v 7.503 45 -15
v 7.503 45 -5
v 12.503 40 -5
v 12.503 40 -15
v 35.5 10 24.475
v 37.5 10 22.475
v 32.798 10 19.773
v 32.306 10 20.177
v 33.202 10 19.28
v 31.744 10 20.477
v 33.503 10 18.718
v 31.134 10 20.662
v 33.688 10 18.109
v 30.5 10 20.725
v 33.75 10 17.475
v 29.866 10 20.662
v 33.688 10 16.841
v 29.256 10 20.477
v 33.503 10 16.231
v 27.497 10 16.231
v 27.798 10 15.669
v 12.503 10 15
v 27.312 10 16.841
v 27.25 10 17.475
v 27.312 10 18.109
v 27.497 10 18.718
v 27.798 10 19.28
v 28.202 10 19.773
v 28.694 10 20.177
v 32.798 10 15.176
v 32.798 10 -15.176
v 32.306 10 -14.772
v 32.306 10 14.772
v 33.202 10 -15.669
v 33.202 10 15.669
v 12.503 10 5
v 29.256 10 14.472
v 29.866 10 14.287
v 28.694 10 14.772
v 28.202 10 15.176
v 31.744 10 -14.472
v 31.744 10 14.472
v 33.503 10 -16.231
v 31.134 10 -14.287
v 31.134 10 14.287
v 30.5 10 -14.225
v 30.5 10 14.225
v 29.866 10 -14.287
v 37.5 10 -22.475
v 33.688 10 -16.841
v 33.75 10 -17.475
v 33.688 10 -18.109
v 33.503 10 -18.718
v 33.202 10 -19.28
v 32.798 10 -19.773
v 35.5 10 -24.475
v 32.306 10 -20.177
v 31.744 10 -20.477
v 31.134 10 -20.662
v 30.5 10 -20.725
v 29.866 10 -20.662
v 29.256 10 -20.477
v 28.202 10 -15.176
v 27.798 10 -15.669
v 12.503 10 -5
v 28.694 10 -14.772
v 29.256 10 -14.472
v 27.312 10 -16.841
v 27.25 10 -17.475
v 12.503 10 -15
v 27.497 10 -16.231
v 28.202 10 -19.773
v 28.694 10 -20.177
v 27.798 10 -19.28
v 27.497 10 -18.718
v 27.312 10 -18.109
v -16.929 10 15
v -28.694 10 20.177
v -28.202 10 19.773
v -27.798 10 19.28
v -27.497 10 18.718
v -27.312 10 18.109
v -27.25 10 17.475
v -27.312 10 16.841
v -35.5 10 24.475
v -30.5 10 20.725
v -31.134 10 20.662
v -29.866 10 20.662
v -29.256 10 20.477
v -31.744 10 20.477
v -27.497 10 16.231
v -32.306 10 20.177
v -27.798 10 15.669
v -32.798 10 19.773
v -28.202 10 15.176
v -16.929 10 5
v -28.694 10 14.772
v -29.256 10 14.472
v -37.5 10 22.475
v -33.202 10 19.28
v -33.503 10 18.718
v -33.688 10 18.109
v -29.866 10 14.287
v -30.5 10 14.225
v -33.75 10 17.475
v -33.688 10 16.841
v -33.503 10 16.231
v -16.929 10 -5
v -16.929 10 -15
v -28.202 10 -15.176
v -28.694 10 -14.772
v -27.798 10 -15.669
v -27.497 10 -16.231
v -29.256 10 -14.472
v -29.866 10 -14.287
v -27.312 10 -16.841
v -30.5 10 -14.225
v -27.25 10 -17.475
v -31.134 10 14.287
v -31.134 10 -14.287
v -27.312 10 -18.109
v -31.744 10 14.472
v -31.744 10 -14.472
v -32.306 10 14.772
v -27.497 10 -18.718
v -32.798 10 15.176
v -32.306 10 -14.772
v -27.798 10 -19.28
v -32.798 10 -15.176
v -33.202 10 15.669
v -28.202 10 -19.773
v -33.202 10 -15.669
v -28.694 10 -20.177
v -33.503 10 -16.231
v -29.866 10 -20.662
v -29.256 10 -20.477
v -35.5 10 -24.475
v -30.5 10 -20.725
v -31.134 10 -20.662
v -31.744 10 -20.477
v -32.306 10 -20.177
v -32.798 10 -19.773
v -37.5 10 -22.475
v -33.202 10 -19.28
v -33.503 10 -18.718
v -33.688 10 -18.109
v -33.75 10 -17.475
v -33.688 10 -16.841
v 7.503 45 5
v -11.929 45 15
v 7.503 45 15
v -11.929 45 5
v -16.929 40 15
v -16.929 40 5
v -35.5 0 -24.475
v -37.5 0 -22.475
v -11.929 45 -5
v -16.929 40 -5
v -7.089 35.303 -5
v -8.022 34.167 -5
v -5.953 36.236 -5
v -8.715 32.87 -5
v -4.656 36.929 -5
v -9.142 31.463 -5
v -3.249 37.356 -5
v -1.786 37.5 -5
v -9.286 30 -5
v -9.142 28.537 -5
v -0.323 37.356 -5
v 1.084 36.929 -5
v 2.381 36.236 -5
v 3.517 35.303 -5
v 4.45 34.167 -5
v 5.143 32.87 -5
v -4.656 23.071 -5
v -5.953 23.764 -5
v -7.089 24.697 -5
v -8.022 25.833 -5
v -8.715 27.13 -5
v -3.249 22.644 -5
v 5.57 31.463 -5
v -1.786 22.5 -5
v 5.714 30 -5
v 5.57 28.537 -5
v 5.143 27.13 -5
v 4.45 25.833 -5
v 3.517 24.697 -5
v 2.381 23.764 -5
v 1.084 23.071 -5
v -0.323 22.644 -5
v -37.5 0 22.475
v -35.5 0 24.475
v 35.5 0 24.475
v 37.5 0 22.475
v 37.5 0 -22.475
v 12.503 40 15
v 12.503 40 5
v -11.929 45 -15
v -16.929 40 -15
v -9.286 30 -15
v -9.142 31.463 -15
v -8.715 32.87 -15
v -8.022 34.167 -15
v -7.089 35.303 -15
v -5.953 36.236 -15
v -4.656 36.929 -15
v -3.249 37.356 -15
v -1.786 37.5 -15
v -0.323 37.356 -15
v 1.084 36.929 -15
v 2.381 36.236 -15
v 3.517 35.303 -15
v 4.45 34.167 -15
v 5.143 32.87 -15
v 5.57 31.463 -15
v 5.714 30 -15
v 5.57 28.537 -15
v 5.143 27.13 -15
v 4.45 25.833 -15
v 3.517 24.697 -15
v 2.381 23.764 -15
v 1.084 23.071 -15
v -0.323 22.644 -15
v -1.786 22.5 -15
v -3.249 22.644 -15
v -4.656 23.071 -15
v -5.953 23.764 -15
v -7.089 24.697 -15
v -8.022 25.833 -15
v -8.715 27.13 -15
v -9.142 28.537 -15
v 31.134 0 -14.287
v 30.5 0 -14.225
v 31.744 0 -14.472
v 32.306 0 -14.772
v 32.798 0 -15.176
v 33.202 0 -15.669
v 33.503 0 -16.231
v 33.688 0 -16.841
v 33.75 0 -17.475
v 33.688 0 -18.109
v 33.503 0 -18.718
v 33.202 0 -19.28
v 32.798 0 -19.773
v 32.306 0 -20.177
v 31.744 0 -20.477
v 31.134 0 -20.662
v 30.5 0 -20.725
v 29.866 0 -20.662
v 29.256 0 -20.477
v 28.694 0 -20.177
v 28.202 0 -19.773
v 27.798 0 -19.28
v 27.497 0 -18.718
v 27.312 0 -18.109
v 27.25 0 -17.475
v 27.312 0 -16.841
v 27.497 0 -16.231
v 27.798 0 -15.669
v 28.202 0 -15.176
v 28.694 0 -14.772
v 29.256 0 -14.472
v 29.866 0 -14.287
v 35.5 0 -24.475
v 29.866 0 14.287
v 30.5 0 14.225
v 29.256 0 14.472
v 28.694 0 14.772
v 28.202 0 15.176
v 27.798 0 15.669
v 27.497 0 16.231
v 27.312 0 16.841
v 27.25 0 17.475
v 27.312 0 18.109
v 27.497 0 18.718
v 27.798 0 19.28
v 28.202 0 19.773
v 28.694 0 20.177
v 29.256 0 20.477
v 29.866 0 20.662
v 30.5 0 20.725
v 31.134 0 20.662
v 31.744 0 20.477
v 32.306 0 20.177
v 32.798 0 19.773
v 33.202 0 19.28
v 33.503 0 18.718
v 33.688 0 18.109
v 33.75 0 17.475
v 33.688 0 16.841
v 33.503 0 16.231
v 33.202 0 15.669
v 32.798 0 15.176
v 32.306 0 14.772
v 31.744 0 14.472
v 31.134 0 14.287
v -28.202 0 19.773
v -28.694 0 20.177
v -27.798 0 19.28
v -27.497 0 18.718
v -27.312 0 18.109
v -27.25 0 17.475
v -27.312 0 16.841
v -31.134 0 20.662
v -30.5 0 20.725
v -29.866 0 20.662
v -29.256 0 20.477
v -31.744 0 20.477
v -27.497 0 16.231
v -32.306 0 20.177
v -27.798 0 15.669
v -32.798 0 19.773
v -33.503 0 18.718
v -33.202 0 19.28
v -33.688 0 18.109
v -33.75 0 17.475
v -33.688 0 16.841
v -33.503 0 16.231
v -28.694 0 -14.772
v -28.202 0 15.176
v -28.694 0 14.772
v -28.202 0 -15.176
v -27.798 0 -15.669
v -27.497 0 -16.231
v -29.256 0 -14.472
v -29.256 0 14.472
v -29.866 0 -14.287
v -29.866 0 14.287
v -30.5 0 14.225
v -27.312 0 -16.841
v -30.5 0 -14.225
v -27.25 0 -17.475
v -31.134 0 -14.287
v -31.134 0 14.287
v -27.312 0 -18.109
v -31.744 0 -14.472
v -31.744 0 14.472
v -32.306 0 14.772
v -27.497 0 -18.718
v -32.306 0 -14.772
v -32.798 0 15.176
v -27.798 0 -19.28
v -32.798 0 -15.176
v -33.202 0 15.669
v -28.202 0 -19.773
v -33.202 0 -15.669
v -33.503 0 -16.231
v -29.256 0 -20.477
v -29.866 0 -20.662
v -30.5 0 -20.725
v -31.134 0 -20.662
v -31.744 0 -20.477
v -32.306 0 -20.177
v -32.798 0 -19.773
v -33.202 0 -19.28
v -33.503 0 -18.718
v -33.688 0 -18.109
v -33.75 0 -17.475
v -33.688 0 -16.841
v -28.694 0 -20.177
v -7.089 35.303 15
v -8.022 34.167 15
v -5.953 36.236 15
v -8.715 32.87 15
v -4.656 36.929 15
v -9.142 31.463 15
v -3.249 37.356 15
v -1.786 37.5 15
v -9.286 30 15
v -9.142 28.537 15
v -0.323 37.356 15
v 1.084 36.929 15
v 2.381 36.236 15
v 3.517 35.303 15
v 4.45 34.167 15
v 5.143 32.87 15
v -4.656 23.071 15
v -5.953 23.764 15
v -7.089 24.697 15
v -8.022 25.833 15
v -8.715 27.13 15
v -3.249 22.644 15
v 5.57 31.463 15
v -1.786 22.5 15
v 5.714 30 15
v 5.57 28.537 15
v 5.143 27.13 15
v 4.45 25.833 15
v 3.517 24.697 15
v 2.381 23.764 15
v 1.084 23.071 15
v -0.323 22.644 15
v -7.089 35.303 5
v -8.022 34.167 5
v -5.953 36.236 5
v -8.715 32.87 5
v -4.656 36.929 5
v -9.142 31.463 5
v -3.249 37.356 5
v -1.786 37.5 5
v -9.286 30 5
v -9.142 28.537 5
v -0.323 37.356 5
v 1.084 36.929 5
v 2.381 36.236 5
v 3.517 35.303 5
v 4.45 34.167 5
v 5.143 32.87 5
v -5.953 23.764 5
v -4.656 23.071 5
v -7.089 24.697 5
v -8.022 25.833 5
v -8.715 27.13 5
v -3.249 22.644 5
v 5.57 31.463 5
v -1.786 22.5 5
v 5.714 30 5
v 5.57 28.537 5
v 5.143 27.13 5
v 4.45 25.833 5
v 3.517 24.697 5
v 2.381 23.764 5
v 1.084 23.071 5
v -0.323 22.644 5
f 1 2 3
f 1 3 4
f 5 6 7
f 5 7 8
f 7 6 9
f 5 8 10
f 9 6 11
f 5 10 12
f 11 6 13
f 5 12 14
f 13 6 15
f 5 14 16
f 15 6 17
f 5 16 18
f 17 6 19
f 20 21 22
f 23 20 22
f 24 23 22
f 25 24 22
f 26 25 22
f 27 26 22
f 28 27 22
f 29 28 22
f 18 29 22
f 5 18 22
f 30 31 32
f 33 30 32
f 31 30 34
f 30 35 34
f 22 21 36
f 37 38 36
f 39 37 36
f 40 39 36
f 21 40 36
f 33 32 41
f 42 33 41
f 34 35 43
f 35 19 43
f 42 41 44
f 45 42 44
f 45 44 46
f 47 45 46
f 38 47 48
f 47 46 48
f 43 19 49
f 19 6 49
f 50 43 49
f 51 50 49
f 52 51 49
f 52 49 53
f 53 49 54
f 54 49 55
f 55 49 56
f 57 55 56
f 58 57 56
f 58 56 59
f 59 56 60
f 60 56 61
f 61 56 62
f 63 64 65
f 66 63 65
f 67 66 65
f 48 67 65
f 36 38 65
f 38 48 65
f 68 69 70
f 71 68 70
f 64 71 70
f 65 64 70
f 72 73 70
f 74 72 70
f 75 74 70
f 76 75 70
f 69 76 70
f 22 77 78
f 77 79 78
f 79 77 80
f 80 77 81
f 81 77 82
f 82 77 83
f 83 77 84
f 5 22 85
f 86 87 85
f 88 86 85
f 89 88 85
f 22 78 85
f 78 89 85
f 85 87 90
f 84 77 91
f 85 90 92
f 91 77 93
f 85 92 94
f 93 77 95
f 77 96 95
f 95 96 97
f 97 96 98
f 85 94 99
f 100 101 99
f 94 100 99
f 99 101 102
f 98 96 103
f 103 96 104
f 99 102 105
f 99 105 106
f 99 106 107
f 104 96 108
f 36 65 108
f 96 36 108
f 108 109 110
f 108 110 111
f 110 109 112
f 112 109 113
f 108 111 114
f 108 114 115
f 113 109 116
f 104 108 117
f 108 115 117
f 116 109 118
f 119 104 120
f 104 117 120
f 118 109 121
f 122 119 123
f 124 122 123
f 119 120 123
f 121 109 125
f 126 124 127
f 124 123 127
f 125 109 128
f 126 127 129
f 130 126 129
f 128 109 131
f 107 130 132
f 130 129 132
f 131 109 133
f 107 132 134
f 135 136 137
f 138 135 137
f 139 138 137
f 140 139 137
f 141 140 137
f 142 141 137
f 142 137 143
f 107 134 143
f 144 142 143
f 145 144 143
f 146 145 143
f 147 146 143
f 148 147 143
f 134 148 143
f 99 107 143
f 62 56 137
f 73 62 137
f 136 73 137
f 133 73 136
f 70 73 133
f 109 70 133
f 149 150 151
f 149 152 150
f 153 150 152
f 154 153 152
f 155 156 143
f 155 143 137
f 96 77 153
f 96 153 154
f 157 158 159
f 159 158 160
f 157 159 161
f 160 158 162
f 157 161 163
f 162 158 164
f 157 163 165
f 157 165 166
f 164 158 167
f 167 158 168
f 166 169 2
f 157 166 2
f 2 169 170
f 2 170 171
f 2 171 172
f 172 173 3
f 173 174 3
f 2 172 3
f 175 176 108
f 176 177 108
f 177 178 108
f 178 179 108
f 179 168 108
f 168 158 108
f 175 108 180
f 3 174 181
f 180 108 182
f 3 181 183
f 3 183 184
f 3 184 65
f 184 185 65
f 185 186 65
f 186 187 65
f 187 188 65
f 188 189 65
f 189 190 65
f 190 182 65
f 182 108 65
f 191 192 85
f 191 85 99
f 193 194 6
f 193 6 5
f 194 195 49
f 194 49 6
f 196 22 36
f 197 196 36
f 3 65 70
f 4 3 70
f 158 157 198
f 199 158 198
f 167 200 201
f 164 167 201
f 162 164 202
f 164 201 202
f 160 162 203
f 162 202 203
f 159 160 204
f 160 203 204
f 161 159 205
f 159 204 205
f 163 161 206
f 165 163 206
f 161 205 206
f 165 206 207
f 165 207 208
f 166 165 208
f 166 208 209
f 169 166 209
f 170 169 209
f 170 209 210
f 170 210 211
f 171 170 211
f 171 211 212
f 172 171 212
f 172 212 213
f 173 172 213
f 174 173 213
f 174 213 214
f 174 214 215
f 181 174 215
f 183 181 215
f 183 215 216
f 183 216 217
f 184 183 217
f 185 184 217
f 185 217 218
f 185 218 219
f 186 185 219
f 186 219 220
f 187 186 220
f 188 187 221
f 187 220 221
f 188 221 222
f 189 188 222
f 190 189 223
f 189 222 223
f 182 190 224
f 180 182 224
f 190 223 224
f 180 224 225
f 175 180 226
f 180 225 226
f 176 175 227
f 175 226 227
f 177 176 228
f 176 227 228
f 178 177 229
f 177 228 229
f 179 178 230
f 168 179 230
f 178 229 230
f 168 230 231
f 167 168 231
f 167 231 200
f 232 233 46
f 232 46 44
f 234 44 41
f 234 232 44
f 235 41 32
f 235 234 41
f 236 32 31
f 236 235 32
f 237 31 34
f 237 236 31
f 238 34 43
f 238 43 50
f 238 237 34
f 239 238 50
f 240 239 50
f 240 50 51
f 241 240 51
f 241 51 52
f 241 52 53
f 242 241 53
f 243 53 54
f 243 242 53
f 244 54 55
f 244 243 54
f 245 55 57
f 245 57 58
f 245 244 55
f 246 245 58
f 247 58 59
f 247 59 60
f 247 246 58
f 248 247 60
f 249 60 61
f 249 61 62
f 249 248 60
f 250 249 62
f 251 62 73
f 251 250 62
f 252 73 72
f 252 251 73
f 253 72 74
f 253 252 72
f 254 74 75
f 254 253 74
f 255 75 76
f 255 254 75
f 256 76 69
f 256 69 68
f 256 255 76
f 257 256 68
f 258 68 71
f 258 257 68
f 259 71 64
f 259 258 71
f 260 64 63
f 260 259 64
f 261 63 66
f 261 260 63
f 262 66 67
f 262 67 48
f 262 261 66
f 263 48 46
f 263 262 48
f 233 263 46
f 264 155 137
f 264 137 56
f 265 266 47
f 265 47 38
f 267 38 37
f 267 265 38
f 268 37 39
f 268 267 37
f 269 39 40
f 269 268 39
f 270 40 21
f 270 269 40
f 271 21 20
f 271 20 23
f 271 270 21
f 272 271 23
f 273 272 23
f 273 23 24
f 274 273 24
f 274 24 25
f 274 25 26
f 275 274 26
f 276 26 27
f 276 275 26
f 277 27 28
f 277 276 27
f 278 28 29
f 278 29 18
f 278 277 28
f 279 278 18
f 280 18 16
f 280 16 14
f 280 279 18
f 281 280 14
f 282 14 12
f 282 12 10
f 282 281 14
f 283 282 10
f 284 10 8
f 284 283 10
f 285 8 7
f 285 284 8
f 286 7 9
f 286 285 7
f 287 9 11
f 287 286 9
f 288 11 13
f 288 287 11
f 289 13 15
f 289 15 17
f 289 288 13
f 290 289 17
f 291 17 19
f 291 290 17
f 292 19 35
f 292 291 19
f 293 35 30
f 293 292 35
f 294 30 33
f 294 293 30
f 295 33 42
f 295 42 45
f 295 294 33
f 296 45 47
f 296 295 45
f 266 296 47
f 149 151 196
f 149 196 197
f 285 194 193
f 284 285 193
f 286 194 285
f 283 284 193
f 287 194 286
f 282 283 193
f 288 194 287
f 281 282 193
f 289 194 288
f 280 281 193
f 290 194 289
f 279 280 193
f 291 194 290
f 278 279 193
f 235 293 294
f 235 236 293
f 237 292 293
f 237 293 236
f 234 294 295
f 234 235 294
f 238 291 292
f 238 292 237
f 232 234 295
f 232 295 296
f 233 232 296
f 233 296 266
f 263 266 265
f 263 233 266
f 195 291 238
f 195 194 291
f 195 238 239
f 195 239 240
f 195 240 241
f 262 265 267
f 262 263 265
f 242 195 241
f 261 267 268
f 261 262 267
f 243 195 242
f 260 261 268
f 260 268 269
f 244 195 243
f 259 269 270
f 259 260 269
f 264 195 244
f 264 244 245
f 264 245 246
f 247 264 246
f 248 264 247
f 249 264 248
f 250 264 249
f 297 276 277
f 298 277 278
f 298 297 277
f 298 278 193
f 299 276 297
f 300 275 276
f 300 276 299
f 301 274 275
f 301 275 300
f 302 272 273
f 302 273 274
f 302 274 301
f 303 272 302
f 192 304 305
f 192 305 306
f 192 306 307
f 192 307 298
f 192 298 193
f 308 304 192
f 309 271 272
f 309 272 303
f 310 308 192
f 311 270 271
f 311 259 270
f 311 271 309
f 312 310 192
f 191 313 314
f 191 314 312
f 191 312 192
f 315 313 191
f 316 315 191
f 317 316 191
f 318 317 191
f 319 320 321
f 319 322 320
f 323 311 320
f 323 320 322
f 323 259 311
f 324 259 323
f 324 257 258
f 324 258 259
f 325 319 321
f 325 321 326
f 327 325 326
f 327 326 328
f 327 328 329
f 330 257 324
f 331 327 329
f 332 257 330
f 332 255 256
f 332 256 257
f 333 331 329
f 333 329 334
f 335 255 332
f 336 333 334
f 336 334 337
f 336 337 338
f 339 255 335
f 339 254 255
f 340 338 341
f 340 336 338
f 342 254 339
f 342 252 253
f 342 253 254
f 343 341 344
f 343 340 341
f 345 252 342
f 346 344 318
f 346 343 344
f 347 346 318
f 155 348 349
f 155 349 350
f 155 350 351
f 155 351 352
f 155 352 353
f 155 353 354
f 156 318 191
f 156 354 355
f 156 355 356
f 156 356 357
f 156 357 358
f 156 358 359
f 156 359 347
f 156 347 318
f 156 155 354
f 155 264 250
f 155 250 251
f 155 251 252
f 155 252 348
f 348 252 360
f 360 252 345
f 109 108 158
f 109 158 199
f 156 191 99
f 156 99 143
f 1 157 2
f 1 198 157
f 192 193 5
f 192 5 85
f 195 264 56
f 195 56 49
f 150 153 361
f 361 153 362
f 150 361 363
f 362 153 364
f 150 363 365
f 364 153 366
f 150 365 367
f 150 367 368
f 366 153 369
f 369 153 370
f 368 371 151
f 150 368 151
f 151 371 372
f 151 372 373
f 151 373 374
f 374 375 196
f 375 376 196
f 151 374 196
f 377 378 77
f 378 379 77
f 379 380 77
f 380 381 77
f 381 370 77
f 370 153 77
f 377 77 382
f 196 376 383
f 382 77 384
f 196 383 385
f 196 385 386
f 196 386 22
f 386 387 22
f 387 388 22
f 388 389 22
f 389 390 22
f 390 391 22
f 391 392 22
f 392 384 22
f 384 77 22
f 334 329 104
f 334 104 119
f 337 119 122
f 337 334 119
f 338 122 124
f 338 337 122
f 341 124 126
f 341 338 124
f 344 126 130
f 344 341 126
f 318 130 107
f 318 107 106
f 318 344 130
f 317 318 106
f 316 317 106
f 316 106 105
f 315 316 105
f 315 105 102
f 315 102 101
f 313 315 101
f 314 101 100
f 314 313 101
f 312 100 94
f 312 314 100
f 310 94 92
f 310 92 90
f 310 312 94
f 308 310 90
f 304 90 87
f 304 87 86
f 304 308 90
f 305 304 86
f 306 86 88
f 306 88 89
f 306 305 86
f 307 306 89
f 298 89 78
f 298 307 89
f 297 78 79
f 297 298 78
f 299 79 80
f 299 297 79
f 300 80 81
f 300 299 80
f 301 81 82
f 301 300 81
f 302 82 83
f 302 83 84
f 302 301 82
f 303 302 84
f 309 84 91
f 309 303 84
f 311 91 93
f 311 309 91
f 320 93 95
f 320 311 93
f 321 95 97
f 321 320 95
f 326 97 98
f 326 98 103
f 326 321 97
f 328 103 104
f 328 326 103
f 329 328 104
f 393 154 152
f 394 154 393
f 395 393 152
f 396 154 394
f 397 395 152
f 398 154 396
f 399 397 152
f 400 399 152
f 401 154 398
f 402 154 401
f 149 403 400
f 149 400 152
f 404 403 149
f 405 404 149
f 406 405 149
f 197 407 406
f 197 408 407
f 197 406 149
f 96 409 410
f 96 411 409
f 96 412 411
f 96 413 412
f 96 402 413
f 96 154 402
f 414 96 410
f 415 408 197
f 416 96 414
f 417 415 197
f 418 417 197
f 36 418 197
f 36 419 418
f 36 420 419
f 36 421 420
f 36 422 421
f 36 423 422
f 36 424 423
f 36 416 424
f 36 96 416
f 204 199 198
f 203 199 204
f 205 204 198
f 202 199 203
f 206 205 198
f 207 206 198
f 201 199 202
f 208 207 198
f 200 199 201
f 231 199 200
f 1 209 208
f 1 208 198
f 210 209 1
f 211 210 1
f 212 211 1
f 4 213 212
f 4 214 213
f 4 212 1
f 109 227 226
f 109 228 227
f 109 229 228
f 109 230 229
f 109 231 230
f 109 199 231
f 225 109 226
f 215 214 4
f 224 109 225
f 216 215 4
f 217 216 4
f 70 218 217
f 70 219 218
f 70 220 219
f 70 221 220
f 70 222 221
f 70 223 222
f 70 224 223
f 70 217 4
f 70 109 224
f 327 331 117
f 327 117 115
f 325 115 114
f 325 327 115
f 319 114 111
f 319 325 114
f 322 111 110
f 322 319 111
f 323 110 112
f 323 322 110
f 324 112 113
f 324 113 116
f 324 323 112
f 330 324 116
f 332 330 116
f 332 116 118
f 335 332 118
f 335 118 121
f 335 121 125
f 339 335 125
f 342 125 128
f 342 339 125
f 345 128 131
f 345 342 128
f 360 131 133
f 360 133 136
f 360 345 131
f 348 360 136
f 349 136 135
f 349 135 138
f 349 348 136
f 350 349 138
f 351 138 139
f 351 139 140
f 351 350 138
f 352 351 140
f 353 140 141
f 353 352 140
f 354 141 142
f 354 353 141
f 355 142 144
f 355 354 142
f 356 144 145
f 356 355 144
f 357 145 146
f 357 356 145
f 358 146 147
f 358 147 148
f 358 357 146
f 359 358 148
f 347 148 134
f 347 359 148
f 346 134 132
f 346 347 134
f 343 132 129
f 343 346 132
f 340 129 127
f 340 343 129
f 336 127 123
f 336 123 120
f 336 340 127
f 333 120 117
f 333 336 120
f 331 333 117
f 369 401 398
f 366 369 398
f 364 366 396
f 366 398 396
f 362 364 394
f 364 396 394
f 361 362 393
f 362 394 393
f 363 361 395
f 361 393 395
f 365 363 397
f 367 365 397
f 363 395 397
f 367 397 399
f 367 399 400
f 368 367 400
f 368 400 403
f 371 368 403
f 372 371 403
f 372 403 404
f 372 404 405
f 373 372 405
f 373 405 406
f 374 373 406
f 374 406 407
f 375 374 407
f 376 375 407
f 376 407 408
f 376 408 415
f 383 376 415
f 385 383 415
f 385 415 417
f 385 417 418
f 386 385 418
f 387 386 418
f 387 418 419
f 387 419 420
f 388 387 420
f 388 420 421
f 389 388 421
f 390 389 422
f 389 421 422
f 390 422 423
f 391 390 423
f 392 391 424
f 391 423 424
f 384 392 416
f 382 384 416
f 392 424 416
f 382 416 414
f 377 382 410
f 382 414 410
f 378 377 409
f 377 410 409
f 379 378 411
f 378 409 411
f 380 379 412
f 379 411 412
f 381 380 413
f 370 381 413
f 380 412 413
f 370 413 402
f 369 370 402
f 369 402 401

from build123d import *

# Parameters (mm, degrees)
SKETCH1_R           = 3.25
BOSS_EXTRUDE1_DEPTH = 10
SKETCH2_W           = 29.431964563
SKETCH2_H           = 10
BOSS_EXTRUDE2_DEPTH = 35
SKETCH3_R           = 7.5
CUT_EXTRUDE1_DEPTH  = 35
CHAMFER1_SIZE       = 5


with BuildPart() as part:
    # Sketch1 → Boss-Extrude1 (new body)
    with BuildSketch(Plane(origin=(0, 0, 0), x_dir=(1, 0, 0), z_dir=(0, 1, 0))):
        Polygon((-37.5, -22.474596659), (-37.5, 22.474596659), (-35.5, 24.474596659), (35.5, 24.474596659), (37.5, 22.474596659), (37.5, -22.474596659), (35.5, -24.474596659), (-35.5, -24.474596659), align=None)
        with Locations(Location((-30.5, 17.474596659, 0), (0, 0, 270))):
            Circle(SKETCH1_R, mode=Mode.SUBTRACT)
        with Locations(Location((30.5, 17.474596659, 0), (0, 0, 270))):
            Circle(SKETCH1_R, mode=Mode.SUBTRACT)
        with Locations(Location((30.5, -17.474596659, 0), (0, 0, 90))):
            Circle(SKETCH1_R, mode=Mode.SUBTRACT)
        with Locations(Location((-30.5, -17.474596659, 0), (0, 0, 90))):
            Circle(SKETCH1_R, mode=Mode.SUBTRACT)
    extrude(amount=BOSS_EXTRUDE1_DEPTH)

    # Sketch2 → Boss-Extrude2 (add)
    with BuildSketch(Plane(origin=(0, 10, 0), x_dir=(1, 0, 0), z_dir=(0, 1, 0))):
        with Locations((-2.213221609, -10)):
            Rectangle(SKETCH2_W, SKETCH2_H)
        with Locations((-2.213221609, 10)):
            Rectangle(SKETCH2_W, SKETCH2_H)
    extrude(amount=BOSS_EXTRUDE2_DEPTH)

    # Sketch3 → Cut-Extrude1 (cut)
    with BuildSketch(Plane(origin=(0, 0, -15), x_dir=(-1, 0, 0), z_dir=(0, 0, -1))):
        with Locations((1.786108667, 30)):
            Circle(SKETCH3_R)
    extrude(amount=-CUT_EXTRUDE1_DEPTH, mode=Mode.SUBTRACT)

    # Chamfer1
    chamfer1_edges = [part.edges().sort_by_distance(p)[0] for p in [
        (-16.929203891, 45, -10),
        (12.502760672, 45, -10),
        (12.502760672, 45, 10),
        (-16.929203891, 45, 10),
    ]]
    chamfer(chamfer1_edges, length=CHAMFER1_SIZE)


solid = part.part
